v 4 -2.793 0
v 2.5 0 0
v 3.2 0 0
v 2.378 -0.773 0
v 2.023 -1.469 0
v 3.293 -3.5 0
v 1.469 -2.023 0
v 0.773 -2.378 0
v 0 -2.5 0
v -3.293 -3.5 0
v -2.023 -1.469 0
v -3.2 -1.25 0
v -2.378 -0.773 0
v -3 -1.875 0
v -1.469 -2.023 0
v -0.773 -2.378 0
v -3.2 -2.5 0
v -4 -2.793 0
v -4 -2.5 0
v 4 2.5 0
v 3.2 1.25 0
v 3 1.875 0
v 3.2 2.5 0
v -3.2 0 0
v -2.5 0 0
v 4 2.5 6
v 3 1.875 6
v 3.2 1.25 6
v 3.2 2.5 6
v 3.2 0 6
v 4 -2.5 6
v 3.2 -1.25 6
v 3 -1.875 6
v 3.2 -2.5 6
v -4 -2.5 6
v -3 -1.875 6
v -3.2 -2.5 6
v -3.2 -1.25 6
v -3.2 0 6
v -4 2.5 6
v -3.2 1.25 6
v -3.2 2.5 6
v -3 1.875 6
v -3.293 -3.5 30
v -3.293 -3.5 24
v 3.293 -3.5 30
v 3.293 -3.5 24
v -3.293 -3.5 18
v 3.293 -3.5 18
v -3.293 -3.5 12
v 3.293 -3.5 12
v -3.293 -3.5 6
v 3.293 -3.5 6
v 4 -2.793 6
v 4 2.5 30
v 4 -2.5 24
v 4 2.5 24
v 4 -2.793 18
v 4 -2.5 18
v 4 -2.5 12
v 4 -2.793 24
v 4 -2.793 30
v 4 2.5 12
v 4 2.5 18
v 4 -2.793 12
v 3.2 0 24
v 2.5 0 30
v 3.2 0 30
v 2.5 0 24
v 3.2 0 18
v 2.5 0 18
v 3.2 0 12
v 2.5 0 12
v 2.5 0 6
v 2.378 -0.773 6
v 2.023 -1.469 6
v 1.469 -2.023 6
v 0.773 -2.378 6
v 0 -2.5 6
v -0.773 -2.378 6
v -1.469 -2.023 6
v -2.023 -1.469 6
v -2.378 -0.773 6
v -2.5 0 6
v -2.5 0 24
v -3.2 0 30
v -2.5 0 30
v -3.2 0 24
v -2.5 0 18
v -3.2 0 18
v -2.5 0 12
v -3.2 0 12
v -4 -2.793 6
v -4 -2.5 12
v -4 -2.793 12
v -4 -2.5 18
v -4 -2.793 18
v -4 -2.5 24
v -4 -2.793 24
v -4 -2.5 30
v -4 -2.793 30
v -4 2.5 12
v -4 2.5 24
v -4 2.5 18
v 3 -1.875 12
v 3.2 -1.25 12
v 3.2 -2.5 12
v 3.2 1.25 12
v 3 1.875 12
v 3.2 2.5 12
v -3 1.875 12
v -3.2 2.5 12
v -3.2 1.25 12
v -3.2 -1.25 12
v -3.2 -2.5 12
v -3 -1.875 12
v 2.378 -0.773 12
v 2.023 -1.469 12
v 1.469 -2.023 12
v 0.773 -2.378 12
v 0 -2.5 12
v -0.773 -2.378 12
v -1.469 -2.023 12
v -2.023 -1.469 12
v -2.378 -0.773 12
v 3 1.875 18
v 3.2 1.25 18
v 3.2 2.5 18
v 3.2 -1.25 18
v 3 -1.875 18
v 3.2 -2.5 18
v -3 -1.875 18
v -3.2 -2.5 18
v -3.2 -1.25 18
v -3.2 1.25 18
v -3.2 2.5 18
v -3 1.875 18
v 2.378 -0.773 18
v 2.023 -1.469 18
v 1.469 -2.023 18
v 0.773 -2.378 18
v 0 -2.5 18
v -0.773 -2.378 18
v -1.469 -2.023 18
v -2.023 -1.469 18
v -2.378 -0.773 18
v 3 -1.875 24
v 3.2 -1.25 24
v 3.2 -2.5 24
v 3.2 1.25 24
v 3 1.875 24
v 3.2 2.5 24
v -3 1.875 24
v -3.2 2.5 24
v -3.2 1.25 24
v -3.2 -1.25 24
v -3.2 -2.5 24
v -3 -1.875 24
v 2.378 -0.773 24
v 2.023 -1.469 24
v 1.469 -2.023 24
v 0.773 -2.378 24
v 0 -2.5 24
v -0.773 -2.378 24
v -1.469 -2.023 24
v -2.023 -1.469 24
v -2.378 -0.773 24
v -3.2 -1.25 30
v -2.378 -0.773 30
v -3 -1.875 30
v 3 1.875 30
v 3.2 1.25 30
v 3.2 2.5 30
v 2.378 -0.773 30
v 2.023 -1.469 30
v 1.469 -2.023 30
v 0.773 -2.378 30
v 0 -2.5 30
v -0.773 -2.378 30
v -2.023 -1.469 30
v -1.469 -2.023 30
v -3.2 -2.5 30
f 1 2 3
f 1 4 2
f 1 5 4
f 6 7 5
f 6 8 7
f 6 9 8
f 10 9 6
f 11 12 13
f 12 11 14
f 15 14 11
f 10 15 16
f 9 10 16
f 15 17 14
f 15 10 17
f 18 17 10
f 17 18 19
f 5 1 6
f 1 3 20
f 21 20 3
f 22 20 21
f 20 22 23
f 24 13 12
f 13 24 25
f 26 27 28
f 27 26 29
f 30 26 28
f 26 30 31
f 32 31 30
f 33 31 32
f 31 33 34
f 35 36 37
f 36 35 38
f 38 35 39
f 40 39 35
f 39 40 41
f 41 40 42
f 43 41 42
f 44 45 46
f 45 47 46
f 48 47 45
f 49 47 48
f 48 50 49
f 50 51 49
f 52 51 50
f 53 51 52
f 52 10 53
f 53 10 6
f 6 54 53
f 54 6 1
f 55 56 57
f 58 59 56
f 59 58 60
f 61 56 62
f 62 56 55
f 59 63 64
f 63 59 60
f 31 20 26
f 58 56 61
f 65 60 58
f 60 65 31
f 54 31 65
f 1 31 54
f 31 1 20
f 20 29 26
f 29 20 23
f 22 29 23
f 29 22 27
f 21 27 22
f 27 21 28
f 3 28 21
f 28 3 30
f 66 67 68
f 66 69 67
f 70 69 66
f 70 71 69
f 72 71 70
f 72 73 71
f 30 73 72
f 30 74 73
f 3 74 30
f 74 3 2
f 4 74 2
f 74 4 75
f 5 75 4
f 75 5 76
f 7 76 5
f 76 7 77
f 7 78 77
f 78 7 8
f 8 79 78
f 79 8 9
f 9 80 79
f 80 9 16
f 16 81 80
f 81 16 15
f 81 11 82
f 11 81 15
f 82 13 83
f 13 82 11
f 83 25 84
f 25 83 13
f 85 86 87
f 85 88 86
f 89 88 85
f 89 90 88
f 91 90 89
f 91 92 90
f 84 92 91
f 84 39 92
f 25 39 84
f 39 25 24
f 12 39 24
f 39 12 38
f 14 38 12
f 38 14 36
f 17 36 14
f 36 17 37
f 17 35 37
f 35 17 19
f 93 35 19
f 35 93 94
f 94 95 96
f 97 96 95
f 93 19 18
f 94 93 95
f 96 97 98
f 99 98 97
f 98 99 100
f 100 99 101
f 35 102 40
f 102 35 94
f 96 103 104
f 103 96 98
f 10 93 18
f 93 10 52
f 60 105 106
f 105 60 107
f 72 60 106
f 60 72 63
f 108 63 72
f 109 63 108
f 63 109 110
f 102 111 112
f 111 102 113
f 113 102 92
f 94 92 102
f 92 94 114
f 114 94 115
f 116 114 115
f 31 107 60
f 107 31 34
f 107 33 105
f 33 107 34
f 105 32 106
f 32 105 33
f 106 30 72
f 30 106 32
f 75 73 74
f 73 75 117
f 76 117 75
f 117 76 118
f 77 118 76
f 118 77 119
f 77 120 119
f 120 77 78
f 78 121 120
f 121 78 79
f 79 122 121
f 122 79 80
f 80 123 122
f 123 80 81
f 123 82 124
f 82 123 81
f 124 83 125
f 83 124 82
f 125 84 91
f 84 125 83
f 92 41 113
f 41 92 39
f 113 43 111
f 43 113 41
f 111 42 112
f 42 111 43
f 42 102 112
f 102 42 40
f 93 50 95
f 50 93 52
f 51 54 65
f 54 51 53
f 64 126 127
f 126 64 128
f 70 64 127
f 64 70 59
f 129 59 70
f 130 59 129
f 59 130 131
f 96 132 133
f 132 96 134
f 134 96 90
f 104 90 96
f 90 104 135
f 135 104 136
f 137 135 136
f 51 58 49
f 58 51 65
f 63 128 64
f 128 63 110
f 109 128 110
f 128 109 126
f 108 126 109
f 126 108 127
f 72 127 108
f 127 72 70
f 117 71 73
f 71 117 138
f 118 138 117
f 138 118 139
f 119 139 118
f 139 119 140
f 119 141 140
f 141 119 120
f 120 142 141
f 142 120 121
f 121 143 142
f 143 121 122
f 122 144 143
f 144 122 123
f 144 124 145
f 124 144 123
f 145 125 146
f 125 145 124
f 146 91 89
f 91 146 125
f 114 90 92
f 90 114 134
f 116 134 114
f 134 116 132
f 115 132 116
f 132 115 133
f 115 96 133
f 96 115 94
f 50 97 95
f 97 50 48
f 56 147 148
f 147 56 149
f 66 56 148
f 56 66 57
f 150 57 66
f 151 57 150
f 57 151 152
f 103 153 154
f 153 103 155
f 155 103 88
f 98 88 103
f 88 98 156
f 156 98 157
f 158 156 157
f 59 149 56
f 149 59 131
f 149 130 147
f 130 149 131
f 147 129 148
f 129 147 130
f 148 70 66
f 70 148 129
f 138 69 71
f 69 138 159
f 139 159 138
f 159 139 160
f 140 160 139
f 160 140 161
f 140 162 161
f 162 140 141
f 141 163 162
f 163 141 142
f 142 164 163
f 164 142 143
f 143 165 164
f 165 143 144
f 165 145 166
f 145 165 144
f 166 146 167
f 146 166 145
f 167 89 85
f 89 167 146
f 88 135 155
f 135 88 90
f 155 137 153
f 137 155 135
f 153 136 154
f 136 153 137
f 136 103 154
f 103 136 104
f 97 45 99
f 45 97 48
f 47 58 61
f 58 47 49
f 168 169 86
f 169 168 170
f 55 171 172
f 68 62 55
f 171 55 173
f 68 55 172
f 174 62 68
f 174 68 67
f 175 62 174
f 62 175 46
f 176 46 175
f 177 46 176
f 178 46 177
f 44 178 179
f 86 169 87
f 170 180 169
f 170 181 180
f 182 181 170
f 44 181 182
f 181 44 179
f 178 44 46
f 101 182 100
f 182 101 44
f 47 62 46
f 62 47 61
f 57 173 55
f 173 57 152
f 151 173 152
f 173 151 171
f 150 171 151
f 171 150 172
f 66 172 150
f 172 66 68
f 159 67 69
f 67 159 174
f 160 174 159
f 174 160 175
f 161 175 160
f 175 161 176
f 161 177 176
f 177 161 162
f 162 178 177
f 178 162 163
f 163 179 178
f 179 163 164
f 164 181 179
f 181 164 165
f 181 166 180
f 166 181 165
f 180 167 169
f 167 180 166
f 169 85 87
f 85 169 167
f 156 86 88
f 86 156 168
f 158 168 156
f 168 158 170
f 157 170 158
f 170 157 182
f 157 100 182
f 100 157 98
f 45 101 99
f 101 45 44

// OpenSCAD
// Cable marker V2

// FAILED - The clips are small thin to print and break easy

CABLE_DIA = 5;
TEXT = "Cable 1";
WALL = 1;

TEXT_INLAY_ONLY = false;

h = CABLE_DIA + 2 * WALL;
w = CABLE_DIA + 3 * WALL;

LENGTH = 30;

$fn = 20;

MIN_WALL = 0.8;
ClipW = MIN_WALL;
ClipH = h/2 - 1;

//translate([20,0,0]) Half();

if (TEXT_INLAY_ONLY) {
  color("black") Label();
} else {
  difference () {
    union() {
      linear_extrude(LENGTH/5) Half();
      translate([0,0,LENGTH/5]) linear_extrude(LENGTH/5) rotate([0,180,0]) Half();
      translate([0,0,LENGTH/5 * 2]) linear_extrude(LENGTH/5) Half();
      translate([0,0,LENGTH/5 * 3]) linear_extrude(LENGTH/5) rotate([0,180,0]) Half();
      translate([0,0,LENGTH/5 * 4]) linear_extrude(LENGTH/5) Half();
    }
    //Label();
  }
}

module Label() {
  translate([0,-h/2 + 0.2,LENGTH/2])
    rotate([90,-90,0])
      color("black")
        linear_extrude(0.2)
          text("Cable 1", size = CABLE_DIA, valign="center", halign="center");
}

module Half() {
   translate([-w/2, -h/2]) difference() {
    Clip();
    translate([w,h]) rotate([0,0,180]) intersection() {
      Clip();
      translate([w/2,0]) square([w/2, h]);
    }
    translate([w/2, h/2]) circle(d=CABLE_DIA);
  }
}
/*
0                     1
----------------------|
|                     |
|                     |
|                     |
--------------------- | h/2
7                  6| |
                  5/  |     
                 4 \  | 
                    \ |
                    3-|2
*/
p3 = 0.8;
p4 = 1.0;
points = [
  [0,0],
  [w,0],
  [w,h-1],
  [w-p3,h-1],
  [w-p4,h-ClipH/4-1],
  [w-p3, h - ClipH/2 - 1],
  [w-p3, h/2],
  [0,h/2]
];

module Clip() {
  difference() {
    polygon(points);
    for (x = [0, w])
      translate([x,0]) rotate(-45) square(WALL, center=true);
  }
}


module Solid() {
  difference() {
    square([h,h], center=true);
    circle(d=CABLE_DIA);
  }
}
